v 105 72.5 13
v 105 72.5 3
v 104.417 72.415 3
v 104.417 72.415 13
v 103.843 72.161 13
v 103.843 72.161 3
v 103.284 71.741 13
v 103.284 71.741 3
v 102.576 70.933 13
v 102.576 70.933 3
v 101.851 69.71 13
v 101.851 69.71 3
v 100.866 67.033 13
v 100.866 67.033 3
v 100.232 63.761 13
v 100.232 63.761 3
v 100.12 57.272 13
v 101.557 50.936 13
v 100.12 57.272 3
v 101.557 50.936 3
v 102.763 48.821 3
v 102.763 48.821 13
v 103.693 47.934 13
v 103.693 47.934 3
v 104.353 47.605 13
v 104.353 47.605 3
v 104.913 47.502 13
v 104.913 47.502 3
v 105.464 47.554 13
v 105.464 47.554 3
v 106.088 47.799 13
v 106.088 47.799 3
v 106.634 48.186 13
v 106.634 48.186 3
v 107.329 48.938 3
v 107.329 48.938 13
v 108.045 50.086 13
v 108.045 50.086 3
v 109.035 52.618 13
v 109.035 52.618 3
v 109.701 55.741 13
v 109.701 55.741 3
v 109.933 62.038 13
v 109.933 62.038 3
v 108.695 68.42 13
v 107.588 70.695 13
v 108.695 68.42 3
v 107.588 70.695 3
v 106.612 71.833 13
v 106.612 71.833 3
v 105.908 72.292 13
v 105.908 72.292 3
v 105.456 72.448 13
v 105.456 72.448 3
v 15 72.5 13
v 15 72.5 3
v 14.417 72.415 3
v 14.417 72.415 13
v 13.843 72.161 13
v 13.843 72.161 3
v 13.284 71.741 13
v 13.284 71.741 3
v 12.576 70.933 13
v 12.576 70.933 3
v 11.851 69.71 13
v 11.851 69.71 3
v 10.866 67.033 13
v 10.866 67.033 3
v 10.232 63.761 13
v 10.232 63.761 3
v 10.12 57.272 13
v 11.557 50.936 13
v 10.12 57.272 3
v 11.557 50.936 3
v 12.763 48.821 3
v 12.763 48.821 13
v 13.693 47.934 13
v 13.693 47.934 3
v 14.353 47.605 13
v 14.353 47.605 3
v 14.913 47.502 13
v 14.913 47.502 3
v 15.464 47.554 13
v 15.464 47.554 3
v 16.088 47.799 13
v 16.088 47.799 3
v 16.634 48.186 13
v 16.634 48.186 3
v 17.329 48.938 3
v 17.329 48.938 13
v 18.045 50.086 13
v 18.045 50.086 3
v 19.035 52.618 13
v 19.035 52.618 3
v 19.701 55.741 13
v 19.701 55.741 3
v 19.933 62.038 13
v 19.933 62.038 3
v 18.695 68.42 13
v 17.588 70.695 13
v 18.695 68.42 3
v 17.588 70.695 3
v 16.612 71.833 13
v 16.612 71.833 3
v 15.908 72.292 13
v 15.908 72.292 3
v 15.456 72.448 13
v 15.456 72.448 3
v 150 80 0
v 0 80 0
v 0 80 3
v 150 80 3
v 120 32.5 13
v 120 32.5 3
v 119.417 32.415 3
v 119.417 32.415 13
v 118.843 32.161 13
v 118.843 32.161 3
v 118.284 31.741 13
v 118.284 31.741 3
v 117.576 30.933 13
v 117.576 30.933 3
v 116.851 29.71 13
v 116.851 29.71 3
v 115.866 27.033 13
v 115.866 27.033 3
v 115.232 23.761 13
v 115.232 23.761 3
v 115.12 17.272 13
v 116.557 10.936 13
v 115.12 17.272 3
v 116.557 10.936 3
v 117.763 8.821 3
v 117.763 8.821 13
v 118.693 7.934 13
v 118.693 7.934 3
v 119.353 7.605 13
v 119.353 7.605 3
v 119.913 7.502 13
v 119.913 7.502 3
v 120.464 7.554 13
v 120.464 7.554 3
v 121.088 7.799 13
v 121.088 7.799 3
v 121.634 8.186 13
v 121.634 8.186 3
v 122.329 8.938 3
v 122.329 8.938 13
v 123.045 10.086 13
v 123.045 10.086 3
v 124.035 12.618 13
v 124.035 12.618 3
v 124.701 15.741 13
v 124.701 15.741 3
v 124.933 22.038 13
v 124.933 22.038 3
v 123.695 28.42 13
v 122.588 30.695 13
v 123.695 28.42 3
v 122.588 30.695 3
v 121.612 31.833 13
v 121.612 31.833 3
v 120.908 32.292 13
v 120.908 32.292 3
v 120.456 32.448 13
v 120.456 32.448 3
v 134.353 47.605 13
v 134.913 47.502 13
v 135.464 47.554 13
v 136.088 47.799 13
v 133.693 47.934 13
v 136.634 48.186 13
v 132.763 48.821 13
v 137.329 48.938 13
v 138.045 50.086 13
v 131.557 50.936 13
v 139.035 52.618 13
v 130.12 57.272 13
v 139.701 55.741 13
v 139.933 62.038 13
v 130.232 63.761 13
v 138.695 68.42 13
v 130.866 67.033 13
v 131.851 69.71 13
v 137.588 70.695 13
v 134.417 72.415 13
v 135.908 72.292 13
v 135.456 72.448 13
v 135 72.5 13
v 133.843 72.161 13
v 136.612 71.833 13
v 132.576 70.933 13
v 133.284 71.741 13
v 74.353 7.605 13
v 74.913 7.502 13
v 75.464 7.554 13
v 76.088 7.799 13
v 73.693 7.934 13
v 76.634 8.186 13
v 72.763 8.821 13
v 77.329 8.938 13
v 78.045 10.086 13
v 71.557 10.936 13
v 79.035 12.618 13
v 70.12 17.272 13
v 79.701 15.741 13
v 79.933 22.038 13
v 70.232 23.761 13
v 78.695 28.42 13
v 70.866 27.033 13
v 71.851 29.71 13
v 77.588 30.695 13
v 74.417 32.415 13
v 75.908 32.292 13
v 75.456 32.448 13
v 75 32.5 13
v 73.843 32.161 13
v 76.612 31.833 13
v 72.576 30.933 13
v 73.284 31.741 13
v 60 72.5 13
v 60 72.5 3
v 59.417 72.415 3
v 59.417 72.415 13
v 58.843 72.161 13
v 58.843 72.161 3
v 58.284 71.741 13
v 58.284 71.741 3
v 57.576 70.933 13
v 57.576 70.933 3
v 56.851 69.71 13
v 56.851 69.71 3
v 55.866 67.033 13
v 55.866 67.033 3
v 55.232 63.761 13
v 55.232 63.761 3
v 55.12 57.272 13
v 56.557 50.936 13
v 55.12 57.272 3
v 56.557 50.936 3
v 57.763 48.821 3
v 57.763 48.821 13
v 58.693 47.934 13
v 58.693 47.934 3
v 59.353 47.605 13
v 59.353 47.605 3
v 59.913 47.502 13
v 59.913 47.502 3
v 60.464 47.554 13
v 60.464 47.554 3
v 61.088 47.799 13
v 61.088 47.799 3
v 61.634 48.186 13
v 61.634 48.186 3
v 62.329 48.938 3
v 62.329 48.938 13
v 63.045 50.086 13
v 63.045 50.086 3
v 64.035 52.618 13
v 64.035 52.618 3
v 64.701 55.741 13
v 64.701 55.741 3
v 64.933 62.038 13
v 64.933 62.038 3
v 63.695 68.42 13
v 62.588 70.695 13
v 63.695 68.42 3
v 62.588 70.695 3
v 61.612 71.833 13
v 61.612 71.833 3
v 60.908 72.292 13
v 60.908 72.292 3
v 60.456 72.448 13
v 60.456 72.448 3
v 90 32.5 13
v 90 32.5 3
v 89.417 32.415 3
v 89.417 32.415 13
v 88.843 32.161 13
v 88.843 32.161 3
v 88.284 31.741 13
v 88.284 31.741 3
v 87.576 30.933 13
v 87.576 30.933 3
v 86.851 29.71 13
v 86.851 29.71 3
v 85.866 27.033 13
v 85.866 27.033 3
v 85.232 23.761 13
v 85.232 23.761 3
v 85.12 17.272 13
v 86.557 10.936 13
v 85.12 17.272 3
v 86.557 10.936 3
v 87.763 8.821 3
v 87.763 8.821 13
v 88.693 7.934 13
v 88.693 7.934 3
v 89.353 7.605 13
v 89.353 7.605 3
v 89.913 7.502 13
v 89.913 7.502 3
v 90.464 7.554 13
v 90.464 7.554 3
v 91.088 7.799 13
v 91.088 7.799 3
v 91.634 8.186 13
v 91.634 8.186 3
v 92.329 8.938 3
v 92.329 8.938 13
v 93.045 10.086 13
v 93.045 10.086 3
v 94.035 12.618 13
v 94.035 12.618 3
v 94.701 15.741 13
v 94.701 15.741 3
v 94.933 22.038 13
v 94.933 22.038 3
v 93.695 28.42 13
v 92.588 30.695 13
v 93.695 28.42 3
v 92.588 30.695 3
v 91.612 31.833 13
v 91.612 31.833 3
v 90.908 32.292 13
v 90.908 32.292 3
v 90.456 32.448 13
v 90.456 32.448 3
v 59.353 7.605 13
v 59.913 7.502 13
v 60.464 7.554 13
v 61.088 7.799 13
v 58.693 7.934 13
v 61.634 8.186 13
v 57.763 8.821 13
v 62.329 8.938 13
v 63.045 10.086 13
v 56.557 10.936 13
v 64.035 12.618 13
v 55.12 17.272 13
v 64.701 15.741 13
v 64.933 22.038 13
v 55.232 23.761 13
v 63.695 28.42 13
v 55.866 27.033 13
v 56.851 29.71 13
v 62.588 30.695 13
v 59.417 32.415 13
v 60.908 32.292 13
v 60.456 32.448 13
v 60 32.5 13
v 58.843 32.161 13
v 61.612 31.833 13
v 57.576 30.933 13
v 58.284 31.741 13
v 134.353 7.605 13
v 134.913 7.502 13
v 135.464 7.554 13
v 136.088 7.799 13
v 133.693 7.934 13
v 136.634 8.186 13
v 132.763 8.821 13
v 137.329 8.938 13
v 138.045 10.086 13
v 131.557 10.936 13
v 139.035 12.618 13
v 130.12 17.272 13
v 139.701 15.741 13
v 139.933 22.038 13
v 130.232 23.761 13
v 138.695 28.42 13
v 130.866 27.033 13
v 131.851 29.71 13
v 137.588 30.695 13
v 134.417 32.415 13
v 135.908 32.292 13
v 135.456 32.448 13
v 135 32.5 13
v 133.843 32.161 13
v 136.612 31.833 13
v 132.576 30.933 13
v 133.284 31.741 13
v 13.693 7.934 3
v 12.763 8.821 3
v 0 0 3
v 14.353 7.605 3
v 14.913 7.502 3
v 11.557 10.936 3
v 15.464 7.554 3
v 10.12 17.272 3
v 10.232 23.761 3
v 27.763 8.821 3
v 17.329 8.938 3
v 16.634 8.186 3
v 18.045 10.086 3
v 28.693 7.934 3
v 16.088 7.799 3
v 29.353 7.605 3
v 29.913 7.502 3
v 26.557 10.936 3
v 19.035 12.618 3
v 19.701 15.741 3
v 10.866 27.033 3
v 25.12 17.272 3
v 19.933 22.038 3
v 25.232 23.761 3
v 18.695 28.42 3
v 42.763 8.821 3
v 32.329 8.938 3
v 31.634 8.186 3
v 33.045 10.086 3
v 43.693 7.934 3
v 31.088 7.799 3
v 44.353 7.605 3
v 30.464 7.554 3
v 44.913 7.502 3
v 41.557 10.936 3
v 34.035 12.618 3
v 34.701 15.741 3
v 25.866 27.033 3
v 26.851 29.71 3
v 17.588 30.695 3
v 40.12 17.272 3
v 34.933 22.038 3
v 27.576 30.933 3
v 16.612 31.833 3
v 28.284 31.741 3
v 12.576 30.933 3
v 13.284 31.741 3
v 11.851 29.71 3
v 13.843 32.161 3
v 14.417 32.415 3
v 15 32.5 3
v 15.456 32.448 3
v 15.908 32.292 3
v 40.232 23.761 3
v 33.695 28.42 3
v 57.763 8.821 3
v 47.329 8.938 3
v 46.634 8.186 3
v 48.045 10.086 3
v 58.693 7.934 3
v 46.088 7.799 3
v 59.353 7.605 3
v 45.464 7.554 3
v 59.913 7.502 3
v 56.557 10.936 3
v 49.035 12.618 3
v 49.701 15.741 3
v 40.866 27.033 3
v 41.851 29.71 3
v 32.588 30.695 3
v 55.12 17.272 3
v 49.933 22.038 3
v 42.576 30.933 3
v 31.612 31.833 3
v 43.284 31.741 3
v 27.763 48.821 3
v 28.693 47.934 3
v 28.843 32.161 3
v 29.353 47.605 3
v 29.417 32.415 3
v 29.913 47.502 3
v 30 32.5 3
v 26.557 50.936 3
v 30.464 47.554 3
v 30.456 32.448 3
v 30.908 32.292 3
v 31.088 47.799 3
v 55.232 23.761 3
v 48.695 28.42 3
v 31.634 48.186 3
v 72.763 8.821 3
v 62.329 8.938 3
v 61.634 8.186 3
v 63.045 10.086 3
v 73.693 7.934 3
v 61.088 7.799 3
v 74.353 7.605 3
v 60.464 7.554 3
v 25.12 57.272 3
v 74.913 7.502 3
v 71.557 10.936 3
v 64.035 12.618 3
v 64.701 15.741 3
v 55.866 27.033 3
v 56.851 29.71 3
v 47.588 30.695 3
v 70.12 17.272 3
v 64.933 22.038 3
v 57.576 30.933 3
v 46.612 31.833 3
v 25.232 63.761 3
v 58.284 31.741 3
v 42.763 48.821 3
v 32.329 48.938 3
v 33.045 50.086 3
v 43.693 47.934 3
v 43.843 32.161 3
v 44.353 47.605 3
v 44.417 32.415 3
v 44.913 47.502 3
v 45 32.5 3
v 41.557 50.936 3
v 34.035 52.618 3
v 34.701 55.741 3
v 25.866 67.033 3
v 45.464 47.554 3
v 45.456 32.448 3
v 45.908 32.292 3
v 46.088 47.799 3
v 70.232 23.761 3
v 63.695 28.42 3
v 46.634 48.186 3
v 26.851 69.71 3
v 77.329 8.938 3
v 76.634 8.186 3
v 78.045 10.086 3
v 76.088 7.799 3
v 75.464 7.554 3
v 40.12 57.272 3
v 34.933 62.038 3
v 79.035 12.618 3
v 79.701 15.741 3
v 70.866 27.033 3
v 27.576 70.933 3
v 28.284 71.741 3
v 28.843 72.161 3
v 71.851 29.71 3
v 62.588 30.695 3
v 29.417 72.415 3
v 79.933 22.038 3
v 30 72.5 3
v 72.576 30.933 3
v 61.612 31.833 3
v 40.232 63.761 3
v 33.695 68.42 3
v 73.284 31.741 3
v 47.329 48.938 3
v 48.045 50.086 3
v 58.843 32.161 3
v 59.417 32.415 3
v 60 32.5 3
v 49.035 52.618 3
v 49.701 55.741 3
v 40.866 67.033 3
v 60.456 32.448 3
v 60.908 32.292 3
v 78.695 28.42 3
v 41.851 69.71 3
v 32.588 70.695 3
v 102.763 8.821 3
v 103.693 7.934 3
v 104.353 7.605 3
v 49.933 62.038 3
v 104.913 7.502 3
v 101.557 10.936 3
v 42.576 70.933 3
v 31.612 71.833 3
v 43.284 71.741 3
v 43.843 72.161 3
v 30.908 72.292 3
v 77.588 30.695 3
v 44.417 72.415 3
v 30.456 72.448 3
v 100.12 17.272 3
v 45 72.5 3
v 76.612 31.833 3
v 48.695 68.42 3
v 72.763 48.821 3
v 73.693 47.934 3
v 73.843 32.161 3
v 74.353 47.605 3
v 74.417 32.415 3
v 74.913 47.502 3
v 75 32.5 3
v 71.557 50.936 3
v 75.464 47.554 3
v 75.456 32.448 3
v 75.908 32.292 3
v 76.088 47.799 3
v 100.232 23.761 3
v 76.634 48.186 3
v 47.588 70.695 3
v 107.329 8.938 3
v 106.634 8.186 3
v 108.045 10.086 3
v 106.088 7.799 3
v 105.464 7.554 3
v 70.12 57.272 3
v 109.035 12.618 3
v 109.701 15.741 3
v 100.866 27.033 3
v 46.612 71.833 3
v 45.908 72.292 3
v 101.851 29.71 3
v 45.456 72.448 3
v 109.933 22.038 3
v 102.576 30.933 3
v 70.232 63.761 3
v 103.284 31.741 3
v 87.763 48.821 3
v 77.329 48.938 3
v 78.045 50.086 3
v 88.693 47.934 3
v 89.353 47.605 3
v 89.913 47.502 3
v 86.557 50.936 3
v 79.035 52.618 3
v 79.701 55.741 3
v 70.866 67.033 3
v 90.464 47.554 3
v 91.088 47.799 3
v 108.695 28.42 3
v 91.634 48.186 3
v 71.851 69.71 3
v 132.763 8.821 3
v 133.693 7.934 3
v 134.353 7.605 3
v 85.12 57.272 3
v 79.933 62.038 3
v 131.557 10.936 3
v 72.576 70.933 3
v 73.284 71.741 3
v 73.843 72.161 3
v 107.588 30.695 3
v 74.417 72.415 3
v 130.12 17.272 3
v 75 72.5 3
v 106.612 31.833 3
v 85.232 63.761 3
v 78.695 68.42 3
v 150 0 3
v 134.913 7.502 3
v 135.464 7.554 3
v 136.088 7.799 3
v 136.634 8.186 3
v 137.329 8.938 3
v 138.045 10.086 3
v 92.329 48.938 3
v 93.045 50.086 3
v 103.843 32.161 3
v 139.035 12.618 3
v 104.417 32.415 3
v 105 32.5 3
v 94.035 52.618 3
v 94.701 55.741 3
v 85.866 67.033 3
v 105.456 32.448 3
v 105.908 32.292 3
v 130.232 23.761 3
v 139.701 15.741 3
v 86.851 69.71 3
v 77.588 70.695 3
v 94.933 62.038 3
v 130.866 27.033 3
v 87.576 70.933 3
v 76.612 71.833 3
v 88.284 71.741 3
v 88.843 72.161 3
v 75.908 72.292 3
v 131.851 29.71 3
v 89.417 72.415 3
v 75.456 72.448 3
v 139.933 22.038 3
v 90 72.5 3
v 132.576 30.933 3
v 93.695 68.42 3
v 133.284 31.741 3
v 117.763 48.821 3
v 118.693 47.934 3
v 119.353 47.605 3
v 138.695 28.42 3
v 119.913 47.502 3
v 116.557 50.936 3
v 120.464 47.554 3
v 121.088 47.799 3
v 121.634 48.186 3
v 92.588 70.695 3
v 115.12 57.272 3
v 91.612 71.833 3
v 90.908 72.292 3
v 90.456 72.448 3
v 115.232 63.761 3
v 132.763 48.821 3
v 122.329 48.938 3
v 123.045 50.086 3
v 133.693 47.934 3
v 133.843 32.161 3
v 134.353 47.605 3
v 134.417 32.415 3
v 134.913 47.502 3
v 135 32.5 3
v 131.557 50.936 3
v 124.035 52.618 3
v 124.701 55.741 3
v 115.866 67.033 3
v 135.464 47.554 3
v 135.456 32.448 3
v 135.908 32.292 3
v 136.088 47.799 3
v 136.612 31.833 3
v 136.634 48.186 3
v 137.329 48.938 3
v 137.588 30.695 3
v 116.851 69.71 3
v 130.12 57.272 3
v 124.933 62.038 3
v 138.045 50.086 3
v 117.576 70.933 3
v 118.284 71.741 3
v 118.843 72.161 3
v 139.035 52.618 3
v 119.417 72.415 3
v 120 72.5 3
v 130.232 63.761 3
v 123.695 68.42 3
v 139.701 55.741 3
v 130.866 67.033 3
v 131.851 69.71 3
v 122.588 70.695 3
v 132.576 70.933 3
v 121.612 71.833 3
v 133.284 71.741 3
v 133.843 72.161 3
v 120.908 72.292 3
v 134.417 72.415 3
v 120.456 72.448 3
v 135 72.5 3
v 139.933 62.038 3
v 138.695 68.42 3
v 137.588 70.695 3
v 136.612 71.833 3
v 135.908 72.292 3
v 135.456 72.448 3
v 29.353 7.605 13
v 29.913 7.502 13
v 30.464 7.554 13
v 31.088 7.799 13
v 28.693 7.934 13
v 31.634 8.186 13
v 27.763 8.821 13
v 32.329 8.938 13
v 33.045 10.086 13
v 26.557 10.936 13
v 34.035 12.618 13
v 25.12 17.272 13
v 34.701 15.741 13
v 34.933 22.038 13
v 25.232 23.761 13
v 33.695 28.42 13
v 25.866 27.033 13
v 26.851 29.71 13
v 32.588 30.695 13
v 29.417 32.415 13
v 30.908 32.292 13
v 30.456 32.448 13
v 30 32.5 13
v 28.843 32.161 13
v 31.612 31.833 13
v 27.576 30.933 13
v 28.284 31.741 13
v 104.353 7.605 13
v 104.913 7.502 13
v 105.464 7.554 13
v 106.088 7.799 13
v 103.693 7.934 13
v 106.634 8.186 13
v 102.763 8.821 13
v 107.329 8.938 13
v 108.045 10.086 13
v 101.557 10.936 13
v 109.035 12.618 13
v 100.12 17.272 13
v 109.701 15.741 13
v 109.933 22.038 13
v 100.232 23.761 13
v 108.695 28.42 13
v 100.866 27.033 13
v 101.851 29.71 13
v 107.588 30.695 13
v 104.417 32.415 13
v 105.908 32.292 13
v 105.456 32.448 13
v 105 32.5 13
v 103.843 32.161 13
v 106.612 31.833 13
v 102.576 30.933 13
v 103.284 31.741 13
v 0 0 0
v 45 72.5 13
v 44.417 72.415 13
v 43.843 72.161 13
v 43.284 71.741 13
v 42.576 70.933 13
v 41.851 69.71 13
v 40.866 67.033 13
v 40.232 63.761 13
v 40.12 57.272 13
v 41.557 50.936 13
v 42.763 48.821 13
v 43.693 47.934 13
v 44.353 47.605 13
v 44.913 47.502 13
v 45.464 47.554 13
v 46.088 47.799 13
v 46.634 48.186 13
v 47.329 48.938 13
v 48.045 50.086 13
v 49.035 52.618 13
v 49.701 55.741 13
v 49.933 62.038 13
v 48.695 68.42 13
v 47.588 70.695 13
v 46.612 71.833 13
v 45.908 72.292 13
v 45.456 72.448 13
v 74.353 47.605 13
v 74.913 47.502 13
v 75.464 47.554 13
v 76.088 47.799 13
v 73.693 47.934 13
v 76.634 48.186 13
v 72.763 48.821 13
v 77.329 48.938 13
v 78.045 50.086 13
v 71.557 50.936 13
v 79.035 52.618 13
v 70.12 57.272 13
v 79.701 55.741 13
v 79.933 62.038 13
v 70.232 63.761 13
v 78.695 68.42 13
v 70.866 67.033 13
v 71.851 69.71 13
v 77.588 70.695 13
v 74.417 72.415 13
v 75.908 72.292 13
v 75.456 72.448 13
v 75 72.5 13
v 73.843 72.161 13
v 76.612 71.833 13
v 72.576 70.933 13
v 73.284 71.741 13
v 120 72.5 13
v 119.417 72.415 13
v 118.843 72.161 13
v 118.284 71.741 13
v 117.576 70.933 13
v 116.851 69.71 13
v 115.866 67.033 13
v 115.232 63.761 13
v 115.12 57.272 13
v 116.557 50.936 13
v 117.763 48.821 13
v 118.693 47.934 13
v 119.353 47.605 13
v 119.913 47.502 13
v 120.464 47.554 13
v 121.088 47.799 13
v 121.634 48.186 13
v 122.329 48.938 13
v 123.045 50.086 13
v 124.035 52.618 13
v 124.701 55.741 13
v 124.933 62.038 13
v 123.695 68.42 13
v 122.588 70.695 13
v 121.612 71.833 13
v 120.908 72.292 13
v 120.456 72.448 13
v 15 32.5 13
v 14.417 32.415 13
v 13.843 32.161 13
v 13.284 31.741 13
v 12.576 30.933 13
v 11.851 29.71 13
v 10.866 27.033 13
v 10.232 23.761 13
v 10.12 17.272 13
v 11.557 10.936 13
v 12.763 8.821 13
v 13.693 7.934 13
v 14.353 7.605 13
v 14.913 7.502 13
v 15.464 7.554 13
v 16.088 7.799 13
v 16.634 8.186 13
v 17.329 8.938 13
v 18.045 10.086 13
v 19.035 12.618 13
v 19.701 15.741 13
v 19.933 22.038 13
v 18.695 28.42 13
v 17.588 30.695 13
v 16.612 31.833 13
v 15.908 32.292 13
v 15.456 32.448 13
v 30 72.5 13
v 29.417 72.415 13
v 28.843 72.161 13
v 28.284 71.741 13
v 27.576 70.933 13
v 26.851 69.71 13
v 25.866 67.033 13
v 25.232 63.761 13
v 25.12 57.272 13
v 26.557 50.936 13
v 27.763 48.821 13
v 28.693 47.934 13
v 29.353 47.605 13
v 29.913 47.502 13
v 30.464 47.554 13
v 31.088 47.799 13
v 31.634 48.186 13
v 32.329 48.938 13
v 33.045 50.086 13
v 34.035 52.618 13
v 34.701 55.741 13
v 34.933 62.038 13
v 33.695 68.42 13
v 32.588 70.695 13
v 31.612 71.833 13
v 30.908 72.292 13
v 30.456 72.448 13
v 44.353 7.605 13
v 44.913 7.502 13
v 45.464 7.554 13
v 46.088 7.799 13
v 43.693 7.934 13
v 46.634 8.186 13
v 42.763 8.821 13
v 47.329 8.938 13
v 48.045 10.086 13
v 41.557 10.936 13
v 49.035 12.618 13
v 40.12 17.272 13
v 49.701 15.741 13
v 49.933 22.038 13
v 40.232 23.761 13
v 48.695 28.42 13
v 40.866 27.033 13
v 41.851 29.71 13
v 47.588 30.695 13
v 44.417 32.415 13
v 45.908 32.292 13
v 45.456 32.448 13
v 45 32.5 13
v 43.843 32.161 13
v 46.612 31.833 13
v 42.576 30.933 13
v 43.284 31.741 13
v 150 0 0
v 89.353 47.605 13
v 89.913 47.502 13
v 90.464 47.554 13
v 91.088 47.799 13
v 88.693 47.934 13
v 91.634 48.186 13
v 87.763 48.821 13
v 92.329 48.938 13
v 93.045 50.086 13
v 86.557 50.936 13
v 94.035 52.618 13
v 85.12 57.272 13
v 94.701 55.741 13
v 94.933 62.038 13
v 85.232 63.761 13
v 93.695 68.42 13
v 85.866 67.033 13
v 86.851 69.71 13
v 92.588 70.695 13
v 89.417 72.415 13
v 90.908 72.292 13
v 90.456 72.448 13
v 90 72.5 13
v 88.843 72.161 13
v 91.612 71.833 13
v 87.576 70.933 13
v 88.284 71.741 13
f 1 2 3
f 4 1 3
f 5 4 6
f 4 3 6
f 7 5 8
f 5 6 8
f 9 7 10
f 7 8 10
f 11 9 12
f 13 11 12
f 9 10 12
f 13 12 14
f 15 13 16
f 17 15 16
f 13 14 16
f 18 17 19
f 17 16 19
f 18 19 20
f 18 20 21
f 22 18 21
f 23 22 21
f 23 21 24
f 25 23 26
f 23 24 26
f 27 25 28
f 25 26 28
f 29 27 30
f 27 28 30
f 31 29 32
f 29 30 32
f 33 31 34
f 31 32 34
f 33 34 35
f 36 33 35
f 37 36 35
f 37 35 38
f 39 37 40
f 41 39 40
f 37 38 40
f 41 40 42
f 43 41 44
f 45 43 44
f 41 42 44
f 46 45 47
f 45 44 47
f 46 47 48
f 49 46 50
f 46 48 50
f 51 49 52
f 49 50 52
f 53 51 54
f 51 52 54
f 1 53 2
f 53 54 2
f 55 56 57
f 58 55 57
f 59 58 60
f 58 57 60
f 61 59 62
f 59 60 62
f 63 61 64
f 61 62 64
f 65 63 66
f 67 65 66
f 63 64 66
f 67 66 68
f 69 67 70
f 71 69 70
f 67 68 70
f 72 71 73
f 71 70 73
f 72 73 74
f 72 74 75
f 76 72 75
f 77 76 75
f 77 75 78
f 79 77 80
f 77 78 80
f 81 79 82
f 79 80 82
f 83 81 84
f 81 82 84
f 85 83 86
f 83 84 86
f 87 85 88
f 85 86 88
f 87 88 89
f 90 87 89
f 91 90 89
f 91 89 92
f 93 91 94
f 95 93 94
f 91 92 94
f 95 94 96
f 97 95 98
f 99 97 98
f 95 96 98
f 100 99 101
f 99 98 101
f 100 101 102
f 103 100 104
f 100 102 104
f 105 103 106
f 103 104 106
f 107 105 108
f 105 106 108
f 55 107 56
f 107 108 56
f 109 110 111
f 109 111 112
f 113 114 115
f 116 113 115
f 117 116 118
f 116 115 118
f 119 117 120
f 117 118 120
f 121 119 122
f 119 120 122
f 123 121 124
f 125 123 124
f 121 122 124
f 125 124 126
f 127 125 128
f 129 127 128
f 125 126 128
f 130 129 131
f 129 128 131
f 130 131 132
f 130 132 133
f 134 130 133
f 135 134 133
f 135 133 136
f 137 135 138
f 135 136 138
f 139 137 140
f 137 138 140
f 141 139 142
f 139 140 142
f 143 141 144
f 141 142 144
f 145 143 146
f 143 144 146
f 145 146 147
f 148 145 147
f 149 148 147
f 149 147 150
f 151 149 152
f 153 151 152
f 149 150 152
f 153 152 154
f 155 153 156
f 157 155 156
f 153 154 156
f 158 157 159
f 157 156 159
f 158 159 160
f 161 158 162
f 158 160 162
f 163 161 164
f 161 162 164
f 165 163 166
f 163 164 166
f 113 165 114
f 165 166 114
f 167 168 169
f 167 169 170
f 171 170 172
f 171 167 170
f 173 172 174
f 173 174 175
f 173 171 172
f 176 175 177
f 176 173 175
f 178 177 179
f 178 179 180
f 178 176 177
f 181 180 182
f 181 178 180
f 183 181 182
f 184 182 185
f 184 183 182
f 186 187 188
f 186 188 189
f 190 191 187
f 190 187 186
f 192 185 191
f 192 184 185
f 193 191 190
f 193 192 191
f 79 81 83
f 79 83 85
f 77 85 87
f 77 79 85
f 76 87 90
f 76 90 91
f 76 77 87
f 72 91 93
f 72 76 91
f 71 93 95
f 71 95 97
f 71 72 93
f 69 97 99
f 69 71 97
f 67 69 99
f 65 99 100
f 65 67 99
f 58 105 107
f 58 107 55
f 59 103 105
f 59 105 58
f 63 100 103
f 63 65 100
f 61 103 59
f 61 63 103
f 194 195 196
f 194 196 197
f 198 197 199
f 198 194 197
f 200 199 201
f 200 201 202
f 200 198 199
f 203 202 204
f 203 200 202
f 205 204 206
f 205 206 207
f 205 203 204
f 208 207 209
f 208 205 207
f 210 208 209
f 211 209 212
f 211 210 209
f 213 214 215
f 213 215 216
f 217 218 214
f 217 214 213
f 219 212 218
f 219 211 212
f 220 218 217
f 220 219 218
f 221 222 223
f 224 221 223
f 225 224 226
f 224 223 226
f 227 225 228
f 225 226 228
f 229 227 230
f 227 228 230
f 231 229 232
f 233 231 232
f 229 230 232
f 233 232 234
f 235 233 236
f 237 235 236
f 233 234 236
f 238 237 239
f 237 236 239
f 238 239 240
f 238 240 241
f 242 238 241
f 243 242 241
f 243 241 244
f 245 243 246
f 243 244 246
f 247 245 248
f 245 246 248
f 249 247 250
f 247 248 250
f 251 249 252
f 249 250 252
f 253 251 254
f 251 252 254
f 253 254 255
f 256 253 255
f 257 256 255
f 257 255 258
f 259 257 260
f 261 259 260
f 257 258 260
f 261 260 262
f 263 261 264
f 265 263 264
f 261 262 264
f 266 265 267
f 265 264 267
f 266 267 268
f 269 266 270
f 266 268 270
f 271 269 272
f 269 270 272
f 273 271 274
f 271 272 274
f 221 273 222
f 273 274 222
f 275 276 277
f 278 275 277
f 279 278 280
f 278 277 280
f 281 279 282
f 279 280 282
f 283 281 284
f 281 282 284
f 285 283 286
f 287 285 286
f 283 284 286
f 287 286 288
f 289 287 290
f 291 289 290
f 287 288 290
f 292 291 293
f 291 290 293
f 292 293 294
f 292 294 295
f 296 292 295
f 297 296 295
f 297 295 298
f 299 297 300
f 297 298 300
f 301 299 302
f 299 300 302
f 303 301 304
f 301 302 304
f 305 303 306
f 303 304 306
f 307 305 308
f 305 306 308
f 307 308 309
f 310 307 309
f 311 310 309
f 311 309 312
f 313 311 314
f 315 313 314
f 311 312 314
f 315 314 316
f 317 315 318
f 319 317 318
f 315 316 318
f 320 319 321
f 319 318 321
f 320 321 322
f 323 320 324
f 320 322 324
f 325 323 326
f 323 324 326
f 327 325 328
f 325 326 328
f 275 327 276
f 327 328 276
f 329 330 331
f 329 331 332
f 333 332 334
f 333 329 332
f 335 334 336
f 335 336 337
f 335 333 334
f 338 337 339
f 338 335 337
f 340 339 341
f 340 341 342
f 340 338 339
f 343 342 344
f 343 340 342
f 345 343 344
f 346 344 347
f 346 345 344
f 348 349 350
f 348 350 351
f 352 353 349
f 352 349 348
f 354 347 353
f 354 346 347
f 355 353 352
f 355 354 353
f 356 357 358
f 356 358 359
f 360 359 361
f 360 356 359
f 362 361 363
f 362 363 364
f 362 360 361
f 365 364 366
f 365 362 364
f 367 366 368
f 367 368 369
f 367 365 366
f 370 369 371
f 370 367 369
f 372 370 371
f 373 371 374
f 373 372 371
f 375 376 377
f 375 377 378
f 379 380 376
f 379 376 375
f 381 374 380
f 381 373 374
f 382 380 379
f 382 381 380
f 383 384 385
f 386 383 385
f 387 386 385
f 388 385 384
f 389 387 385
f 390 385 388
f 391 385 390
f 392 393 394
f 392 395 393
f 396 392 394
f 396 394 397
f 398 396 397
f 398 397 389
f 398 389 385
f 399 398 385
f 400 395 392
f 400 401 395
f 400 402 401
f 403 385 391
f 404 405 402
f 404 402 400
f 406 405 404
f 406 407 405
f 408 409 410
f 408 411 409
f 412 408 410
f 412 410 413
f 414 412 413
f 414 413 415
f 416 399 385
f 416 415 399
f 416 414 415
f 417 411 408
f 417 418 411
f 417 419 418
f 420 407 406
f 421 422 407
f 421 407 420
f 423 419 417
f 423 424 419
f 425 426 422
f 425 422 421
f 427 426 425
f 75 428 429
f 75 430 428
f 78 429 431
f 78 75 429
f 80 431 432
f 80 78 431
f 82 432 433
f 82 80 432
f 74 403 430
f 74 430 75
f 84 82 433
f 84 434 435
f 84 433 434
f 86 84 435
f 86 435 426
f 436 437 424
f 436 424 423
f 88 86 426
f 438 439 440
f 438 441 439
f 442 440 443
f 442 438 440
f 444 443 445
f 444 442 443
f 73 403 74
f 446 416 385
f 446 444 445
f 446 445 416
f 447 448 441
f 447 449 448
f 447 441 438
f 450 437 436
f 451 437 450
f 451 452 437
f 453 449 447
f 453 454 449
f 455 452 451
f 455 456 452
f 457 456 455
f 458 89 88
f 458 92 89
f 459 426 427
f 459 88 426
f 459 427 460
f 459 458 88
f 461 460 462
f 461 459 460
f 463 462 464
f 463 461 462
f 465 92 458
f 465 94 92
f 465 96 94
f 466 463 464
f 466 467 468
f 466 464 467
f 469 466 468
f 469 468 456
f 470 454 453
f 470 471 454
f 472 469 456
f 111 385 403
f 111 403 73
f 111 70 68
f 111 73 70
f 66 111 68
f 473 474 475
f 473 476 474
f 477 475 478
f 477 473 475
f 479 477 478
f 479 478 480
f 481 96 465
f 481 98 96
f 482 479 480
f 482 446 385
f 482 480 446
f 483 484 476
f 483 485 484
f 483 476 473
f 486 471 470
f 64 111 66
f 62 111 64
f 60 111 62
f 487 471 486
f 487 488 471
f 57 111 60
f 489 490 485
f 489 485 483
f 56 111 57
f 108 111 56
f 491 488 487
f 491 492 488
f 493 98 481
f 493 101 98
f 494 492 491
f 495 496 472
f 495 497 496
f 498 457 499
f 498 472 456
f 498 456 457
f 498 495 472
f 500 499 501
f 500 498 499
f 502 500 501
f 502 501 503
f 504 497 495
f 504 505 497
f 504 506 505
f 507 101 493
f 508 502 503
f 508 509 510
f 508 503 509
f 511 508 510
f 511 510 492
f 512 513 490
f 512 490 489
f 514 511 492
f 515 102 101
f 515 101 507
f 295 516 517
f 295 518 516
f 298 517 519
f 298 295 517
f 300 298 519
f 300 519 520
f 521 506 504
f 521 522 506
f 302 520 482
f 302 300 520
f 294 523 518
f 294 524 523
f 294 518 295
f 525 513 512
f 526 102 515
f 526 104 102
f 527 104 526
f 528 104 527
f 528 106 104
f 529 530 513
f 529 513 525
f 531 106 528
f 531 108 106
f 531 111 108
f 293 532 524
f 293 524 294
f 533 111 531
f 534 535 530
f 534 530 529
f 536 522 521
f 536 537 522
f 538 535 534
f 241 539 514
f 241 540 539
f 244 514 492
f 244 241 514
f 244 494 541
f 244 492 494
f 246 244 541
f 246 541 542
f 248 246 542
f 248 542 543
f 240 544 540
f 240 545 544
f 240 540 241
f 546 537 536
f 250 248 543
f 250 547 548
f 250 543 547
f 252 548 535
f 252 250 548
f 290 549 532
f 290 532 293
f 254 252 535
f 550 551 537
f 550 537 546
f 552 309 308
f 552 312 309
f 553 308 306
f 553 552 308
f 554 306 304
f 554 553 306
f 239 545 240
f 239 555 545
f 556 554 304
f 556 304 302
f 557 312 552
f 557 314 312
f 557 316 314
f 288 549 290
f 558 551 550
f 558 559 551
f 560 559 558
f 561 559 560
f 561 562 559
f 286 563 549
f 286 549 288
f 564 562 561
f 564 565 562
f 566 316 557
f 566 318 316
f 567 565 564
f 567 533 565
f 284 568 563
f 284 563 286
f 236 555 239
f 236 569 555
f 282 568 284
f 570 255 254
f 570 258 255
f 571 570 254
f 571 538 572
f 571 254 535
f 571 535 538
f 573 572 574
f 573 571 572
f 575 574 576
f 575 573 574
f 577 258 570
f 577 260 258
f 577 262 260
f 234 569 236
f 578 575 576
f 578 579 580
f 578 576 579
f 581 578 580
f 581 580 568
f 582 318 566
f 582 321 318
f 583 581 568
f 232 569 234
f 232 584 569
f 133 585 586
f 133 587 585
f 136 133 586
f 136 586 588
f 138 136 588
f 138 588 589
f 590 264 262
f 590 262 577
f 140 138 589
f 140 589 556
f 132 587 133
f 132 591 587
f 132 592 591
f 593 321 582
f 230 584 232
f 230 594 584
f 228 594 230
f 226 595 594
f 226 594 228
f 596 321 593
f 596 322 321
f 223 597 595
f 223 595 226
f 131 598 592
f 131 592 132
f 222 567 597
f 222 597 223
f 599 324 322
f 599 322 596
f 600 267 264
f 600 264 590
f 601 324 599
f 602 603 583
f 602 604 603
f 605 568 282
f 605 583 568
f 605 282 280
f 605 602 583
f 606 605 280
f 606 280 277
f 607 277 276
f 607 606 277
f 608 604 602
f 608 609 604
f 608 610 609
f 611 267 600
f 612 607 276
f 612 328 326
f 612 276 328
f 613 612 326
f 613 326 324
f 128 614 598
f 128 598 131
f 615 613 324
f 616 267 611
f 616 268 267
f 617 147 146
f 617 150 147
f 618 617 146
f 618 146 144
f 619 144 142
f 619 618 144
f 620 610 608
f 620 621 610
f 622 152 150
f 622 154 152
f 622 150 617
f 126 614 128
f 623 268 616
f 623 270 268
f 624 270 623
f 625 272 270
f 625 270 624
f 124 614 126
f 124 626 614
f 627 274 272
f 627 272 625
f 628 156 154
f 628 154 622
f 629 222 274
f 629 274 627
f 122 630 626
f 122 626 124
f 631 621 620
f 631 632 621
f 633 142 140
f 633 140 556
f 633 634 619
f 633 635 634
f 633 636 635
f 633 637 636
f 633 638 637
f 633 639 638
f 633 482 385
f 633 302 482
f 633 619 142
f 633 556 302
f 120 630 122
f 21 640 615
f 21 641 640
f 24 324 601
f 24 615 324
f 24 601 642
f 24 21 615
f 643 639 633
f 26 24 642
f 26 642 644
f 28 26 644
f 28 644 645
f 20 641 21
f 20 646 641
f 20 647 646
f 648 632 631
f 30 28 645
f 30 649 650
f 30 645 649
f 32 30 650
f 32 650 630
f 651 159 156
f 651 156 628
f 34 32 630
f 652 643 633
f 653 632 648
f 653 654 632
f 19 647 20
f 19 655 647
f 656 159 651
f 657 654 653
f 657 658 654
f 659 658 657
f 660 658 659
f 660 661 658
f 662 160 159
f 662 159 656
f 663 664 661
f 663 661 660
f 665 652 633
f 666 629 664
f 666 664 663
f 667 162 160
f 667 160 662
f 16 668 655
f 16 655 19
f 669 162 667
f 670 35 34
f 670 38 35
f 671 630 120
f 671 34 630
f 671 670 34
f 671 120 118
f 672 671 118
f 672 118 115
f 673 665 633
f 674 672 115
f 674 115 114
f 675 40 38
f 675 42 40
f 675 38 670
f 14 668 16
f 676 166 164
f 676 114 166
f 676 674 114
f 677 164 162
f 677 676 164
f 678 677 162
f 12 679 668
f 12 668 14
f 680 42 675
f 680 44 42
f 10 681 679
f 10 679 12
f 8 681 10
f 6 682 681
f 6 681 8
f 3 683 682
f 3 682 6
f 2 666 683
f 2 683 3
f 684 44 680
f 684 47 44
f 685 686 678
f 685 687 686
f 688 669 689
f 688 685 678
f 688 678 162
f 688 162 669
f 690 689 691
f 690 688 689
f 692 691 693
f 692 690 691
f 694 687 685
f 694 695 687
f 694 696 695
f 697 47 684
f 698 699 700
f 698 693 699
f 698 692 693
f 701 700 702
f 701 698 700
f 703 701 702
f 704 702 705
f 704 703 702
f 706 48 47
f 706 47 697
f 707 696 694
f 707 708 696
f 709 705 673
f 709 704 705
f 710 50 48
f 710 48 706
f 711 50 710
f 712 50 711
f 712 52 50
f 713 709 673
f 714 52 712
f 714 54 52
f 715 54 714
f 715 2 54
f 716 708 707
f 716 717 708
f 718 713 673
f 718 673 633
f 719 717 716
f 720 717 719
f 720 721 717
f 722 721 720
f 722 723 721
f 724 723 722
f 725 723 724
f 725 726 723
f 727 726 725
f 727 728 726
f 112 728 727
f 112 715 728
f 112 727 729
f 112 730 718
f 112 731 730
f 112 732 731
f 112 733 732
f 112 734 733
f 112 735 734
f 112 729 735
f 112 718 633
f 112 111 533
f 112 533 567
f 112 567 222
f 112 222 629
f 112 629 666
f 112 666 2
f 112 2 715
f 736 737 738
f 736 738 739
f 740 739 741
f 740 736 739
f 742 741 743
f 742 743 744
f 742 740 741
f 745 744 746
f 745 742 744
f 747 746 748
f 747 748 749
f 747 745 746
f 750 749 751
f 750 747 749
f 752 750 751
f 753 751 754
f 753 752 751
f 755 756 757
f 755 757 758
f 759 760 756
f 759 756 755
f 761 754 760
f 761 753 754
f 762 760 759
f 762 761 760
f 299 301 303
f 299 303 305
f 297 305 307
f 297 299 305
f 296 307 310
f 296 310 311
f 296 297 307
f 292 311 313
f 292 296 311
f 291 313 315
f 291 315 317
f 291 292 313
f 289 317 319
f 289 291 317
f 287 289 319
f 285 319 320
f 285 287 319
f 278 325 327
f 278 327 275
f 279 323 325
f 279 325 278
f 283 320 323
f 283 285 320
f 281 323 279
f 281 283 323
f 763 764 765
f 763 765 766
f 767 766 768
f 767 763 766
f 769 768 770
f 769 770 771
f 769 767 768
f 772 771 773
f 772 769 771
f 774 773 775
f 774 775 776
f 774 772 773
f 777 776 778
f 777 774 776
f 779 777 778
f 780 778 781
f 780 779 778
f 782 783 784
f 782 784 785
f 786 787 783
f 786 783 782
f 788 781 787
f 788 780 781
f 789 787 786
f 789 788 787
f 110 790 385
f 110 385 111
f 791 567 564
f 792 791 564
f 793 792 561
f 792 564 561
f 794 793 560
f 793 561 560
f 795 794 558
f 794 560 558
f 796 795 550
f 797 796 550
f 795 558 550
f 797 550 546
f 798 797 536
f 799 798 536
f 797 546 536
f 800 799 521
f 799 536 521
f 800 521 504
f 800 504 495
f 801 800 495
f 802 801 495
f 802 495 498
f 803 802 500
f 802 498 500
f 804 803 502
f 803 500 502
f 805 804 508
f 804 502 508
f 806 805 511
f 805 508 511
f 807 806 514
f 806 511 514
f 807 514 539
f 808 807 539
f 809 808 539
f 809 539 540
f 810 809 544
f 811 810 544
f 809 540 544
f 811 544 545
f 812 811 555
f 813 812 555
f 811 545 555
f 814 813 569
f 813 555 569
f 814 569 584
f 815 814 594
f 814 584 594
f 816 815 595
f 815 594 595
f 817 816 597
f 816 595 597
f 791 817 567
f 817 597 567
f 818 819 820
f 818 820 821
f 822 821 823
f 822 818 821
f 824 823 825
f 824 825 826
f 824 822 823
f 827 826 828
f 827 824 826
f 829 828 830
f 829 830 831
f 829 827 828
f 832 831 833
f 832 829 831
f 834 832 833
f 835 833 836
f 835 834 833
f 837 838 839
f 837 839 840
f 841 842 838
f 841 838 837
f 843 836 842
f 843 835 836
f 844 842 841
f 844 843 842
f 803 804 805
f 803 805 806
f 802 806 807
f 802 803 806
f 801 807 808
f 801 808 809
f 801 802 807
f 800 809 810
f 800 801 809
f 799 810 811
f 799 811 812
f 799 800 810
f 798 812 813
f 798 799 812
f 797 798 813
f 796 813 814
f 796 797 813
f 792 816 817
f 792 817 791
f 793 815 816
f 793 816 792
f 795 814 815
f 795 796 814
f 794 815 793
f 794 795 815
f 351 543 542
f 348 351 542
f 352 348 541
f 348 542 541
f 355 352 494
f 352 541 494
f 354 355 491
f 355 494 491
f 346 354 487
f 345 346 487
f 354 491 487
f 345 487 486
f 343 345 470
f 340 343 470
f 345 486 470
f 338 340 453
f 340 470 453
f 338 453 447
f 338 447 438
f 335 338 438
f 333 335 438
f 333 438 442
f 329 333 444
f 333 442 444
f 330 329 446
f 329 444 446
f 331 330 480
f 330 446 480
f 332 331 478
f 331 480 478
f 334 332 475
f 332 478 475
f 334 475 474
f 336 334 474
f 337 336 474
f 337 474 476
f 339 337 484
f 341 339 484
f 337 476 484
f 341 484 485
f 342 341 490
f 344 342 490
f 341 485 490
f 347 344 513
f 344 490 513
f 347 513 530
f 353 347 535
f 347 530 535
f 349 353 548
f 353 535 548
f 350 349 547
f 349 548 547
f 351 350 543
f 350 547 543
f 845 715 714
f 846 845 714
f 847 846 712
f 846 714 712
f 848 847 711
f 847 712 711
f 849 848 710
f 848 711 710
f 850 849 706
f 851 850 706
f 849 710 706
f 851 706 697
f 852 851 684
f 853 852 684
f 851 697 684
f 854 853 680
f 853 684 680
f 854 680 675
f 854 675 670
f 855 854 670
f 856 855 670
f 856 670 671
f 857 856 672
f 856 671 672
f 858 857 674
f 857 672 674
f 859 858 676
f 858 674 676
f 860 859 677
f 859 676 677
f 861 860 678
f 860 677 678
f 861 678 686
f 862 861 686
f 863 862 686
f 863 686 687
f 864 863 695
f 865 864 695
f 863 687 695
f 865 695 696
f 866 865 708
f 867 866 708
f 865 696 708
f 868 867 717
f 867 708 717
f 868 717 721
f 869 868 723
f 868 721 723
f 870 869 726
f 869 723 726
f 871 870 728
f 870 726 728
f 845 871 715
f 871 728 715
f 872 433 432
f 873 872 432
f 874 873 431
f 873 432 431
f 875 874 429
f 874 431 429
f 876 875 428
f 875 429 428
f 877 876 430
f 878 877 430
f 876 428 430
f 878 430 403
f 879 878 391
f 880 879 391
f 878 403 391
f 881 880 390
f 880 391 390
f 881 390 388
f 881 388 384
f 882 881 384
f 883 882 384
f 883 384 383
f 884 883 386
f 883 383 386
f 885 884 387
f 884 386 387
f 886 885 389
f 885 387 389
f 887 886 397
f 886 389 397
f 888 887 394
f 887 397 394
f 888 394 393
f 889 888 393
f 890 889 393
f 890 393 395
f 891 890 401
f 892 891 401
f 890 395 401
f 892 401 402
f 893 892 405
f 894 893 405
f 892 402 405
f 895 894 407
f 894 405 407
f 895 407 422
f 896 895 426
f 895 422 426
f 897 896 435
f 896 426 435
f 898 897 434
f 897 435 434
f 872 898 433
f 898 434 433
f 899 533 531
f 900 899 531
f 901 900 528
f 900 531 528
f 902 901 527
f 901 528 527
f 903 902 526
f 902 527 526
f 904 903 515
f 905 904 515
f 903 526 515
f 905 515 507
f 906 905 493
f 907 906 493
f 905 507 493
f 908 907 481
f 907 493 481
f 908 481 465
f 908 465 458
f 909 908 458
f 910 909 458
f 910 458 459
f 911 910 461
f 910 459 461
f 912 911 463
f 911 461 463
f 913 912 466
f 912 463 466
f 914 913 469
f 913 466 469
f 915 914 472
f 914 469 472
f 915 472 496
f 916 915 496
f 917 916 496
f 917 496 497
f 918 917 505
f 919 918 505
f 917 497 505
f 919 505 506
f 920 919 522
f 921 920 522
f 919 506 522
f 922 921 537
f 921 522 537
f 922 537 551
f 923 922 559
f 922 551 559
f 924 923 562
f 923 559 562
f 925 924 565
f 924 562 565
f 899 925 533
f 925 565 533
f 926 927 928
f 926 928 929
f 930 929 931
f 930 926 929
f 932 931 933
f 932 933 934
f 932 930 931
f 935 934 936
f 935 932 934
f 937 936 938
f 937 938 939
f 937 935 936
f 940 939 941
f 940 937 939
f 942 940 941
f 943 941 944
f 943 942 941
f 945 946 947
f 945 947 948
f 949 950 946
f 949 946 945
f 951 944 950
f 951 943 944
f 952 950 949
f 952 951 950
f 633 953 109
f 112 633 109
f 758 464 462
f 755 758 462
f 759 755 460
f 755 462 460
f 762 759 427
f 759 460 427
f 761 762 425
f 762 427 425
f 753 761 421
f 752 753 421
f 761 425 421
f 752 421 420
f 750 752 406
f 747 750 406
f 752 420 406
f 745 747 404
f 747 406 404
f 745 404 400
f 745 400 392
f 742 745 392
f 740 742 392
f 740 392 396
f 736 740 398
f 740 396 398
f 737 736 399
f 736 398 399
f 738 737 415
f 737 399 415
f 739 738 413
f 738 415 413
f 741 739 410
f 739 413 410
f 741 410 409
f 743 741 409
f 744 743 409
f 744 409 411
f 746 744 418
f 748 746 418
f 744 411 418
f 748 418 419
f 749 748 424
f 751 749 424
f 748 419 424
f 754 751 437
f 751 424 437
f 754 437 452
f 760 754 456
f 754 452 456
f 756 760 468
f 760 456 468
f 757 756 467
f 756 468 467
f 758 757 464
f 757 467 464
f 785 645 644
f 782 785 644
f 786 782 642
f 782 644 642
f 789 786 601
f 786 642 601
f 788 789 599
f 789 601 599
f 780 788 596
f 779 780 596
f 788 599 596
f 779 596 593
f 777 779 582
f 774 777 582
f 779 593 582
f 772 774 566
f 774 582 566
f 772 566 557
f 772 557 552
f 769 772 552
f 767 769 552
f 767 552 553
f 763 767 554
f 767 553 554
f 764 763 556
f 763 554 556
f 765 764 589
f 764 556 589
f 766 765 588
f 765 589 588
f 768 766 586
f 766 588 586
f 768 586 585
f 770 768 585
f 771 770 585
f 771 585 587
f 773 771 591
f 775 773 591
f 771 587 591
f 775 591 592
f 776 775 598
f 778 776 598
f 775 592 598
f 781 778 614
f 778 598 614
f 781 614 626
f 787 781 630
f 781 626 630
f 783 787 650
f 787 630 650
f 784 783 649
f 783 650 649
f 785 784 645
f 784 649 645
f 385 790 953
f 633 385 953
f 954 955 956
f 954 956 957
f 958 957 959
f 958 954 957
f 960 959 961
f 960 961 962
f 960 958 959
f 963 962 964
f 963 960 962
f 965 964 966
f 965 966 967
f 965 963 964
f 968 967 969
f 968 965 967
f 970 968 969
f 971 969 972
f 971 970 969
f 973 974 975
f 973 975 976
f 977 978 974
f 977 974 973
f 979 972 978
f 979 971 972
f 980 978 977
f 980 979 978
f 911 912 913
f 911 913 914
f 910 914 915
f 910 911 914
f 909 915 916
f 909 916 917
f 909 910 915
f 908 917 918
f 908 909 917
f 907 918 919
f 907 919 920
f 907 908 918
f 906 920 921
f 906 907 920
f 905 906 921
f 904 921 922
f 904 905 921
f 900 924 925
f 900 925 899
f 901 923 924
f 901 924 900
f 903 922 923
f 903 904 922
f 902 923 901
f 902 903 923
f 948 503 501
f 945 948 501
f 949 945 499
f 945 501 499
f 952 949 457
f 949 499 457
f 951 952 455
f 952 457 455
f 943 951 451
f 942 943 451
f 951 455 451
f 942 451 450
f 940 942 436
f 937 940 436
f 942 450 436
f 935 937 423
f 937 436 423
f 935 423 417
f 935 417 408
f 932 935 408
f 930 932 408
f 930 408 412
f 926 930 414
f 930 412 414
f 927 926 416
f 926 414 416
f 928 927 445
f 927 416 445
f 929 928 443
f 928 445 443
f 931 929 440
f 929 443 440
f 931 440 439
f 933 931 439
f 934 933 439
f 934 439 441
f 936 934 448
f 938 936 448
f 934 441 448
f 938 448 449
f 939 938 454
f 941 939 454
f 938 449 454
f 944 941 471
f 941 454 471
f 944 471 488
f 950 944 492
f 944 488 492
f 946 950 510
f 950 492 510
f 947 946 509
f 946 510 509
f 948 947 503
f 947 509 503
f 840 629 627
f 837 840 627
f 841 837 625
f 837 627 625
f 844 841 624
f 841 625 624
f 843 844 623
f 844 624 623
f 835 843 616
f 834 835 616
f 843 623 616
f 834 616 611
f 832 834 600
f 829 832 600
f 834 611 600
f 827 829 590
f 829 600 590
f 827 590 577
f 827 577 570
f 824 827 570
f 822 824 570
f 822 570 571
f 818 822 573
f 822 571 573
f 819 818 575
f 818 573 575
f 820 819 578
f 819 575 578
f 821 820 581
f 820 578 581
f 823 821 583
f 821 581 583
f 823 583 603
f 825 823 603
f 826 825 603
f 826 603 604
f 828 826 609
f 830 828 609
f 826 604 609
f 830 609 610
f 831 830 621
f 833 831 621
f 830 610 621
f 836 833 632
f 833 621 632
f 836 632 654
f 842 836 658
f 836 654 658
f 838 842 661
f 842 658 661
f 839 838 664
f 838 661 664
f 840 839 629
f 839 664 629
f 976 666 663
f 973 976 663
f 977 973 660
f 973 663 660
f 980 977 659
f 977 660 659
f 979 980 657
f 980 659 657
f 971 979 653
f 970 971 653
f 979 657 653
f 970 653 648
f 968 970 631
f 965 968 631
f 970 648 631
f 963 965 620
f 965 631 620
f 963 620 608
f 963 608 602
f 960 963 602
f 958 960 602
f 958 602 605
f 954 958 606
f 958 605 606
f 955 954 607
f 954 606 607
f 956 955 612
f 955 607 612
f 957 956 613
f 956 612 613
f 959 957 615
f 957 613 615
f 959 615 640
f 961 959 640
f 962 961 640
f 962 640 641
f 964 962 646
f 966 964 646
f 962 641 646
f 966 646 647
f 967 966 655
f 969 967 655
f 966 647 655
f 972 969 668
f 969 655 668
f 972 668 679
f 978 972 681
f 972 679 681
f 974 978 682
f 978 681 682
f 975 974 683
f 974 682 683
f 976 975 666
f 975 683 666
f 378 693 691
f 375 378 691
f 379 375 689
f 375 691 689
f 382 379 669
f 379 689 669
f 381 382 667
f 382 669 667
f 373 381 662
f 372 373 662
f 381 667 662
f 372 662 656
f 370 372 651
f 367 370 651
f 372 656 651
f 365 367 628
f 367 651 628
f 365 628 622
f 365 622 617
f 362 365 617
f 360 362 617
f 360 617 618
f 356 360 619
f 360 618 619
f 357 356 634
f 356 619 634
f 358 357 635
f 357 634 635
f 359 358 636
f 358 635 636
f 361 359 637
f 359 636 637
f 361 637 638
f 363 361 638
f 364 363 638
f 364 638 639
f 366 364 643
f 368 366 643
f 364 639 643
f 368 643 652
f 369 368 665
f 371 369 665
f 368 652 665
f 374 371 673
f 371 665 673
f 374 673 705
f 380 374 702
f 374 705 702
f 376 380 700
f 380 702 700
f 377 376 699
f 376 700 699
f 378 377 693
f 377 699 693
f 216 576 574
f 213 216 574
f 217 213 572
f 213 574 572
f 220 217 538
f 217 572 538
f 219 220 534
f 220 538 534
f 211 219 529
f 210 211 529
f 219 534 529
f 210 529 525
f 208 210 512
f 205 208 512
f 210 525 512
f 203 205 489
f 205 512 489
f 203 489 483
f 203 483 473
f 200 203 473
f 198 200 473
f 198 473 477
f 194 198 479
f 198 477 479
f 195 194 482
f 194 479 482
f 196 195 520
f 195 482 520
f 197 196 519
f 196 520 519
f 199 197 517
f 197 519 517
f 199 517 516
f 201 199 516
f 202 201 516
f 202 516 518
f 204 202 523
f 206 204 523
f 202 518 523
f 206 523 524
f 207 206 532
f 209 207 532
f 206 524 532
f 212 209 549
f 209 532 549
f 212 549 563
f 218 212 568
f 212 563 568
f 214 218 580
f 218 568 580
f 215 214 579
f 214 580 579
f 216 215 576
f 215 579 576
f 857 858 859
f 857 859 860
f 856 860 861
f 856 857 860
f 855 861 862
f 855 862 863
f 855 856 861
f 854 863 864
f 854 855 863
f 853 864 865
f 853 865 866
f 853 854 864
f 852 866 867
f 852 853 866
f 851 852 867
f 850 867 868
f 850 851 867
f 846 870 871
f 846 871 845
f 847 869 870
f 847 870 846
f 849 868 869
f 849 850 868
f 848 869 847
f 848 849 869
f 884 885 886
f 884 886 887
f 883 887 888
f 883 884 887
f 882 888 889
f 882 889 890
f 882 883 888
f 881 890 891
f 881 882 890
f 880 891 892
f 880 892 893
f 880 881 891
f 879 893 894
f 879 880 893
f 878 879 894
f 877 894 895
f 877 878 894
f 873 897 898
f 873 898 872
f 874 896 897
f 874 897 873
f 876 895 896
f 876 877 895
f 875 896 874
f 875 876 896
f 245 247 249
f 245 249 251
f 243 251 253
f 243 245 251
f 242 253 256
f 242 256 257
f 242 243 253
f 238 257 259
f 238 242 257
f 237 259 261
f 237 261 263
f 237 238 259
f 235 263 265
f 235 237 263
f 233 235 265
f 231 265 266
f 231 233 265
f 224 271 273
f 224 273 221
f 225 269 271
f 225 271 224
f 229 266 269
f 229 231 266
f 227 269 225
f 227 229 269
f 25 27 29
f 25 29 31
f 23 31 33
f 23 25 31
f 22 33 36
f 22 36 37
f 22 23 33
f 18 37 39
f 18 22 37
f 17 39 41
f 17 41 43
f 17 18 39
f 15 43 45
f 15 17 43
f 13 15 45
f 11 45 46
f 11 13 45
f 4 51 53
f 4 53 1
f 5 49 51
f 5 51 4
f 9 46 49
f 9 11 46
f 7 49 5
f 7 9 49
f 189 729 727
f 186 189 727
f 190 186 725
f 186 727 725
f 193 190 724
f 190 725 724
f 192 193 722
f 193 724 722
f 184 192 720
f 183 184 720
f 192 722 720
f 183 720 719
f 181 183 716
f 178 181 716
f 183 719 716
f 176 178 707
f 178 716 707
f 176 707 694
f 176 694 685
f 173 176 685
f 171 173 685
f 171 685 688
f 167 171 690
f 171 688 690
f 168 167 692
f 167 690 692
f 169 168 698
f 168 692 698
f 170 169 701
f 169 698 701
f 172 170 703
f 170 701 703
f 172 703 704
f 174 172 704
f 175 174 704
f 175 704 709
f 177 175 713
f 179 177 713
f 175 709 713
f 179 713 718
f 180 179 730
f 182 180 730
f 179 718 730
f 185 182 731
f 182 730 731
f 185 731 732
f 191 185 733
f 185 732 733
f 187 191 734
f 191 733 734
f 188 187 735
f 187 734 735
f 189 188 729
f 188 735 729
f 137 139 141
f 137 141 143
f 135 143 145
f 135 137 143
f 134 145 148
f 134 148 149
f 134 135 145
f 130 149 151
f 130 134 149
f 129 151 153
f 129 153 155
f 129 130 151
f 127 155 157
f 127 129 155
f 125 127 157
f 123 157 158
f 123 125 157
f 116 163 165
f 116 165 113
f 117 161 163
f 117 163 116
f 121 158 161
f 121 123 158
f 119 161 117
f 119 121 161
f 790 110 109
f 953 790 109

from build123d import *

# Parameters (mm, degrees)
SKICA1_W            = 150
SKICA1_H            = 80
VYSUNOUT1_DEPTH     = 3
SKICA2_RX           = 12.5
SKICA2_RY           = 5
VYSUNOUT2_DEPTH     = 10
LINPOLE1_COUNT      = 9
LINPOLE1_PITCH      = 15
LINPOLE1_COUNT_DIR2 = 2
LINPOLE1_PITCH_DIR2 = 40


with BuildPart() as part:
    # Skica1 → Vysunout1 (new body)
    with BuildSketch(Plane.XY):
        with Locations((75, 40)):
            Rectangle(SKICA1_W, SKICA1_H)
    extrude(amount=VYSUNOUT1_DEPTH)

    # Skica2 → Vysunout2 (add)
    with BuildSketch(Plane.XY.offset(3)):
        with Locations(Location((15, 60), (0, 0, 90))):
            Ellipse(SKICA2_RX, SKICA2_RY)
    vysunout2 = extrude(amount=VYSUNOUT2_DEPTH)

    # LinPole1: Vysunout2 9 × 2
    with Locations(*[(i * LINPOLE1_PITCH, -j * LINPOLE1_PITCH_DIR2, 0) for i in range(LINPOLE1_COUNT) for j in range(LINPOLE1_COUNT_DIR2) if (i, j) != (0, 0)]):
        add(vysunout2)


solid = part.part
